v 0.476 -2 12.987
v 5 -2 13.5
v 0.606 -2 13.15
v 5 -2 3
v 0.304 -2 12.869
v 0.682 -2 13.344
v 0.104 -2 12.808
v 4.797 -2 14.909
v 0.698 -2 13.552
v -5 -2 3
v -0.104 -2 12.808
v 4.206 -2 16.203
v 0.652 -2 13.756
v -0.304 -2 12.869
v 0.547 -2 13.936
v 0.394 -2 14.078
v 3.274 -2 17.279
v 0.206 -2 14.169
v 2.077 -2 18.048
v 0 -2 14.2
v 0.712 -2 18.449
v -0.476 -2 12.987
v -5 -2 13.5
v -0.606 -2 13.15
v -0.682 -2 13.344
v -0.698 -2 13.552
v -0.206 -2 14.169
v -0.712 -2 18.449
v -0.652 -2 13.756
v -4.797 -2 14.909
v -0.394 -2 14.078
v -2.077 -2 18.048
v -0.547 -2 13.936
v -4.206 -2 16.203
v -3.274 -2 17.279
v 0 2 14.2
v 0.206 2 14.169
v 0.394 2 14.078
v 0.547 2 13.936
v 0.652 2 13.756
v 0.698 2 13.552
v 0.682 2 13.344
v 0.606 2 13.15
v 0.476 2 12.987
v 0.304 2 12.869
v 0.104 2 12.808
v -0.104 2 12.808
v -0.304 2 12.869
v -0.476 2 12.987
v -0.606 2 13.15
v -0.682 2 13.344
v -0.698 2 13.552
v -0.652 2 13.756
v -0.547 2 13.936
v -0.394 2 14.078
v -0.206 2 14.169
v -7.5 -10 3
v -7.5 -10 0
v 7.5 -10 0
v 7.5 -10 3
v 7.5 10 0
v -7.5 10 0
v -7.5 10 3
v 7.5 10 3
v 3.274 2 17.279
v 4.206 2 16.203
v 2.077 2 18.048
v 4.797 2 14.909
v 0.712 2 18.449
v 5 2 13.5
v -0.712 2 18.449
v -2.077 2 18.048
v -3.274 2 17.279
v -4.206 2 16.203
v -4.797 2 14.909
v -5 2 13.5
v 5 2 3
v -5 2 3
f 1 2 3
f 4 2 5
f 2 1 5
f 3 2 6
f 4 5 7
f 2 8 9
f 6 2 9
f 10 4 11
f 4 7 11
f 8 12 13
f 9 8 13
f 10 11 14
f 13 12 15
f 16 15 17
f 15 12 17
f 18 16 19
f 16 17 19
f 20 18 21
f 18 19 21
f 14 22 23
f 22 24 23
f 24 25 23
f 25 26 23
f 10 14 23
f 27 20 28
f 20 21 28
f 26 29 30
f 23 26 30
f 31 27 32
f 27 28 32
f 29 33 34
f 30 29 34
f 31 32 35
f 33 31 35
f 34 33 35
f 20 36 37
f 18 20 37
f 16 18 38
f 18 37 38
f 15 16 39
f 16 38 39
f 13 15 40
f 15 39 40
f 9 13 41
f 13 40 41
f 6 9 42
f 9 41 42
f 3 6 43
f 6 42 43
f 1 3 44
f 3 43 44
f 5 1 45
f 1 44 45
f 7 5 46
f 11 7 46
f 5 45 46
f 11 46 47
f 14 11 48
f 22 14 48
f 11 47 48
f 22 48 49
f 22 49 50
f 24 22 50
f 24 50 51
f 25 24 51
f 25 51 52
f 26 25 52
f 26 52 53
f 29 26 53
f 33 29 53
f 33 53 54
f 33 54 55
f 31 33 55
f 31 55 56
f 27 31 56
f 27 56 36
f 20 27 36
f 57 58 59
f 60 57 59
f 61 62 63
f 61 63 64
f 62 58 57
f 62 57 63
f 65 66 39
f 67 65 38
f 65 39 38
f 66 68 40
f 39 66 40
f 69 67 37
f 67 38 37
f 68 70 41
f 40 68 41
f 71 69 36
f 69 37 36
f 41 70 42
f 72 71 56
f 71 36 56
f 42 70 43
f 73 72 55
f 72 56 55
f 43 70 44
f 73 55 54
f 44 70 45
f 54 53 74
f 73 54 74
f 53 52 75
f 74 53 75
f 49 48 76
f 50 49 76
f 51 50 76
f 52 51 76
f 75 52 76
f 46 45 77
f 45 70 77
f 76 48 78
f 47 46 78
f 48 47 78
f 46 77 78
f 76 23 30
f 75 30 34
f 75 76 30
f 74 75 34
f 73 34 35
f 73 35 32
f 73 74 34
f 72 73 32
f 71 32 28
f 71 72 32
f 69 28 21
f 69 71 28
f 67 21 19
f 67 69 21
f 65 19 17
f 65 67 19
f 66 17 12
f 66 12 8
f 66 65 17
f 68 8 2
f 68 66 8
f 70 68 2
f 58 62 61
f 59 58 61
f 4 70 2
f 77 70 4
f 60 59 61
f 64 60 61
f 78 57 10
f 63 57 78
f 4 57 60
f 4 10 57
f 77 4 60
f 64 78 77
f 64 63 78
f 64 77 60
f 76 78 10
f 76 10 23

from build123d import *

# Parameters (mm, degrees)
SKETCH1_W           = 15
SKETCH1_H           = 20
BOSS_EXTRUDE1_DEPTH = 3
SKETCH2_R           = 0.7
BOSS_EXTRUDE2_DEPTH = 14
SKETCH2_2_R         = 0.7
CUT_EXTRUDE1_DEPTH  = 6
CUT_EXTRUDE2_START  = -2
CUT_EXTRUDE2_DEPTH  = 2
CUT_EXTRUDE3_DEPTH  = 2


with BuildPart() as part:
    # Sketch1 → Boss-Extrude1 (new body)
    with BuildSketch(Plane.XY):
        Rectangle(SKETCH1_W, SKETCH1_H)
    extrude(amount=BOSS_EXTRUDE1_DEPTH)

    # Sketch2 → Boss-Extrude2 (add)
    with BuildSketch(Plane(origin=(0, 10, 0), x_dir=(1, 0, 0), z_dir=(0, 1, 0))):
        with BuildLine():
            Line((-5, -3), (-5, -13.5))
            ThreePointArc((-5, -13.5), (0, -18.5), (5, -13.5))
            Line((5, -13.5), (5, -3))
            Line((5, -3), (-5, -3))
        make_face()
        with Locations((0, -13.5)):
            Circle(SKETCH2_R, mode=Mode.SUBTRACT)
    extrude(amount=-BOSS_EXTRUDE2_DEPTH)

    # Sketch2<2> → Cut-Extrude1 (cut)
    with BuildSketch(Plane(origin=(0, 10, 0), x_dir=(1, 0, 0), z_dir=(0, 1, 0))):
        with BuildLine():
            Line((-5, -3), (-5, -13.5))
            ThreePointArc((-5, -13.5), (0, -18.5), (5, -13.5))
            Line((5, -13.5), (5, -3))
            Line((5, -3), (-5, -3))
        make_face()
        with Locations((0, -13.5)):
            Circle(SKETCH2_2_R, mode=Mode.SUBTRACT)
    extrude(amount=-CUT_EXTRUDE1_DEPTH, mode=Mode.SUBTRACT)

    # Sketch3 → Cut-Extrude2 (cut)
    with BuildSketch(Plane.XZ.offset(4).offset(CUT_EXTRUDE2_START)):
        with BuildLine():
            Line((5, 13.5), (5, 3))
            Line((5, 3), (-5, 3))
            Line((-5, 3), (-5, 13.5))
            ThreePointArc((-5, 13.5), (0, 18.5), (5, 13.5))
        make_face()
    extrude(amount=CUT_EXTRUDE2_DEPTH, mode=Mode.SUBTRACT)

    # Sketch4 → Cut-Extrude3 (cut)
    with BuildSketch(Plane(origin=(0, 4, 0), x_dir=(1, 0, 0), z_dir=(0, 1, 0))):
        with BuildLine():
            Line((-5, -13.5), (-5, -3))
            Line((-5, -3), (5, -3))
            Line((5, -3), (5, -13.5))
            ThreePointArc((5, -13.5), (0, -18.5), (-5, -13.5))
        make_face()
    extrude(amount=-CUT_EXTRUDE3_DEPTH, mode=Mode.SUBTRACT)


solid = part.part
